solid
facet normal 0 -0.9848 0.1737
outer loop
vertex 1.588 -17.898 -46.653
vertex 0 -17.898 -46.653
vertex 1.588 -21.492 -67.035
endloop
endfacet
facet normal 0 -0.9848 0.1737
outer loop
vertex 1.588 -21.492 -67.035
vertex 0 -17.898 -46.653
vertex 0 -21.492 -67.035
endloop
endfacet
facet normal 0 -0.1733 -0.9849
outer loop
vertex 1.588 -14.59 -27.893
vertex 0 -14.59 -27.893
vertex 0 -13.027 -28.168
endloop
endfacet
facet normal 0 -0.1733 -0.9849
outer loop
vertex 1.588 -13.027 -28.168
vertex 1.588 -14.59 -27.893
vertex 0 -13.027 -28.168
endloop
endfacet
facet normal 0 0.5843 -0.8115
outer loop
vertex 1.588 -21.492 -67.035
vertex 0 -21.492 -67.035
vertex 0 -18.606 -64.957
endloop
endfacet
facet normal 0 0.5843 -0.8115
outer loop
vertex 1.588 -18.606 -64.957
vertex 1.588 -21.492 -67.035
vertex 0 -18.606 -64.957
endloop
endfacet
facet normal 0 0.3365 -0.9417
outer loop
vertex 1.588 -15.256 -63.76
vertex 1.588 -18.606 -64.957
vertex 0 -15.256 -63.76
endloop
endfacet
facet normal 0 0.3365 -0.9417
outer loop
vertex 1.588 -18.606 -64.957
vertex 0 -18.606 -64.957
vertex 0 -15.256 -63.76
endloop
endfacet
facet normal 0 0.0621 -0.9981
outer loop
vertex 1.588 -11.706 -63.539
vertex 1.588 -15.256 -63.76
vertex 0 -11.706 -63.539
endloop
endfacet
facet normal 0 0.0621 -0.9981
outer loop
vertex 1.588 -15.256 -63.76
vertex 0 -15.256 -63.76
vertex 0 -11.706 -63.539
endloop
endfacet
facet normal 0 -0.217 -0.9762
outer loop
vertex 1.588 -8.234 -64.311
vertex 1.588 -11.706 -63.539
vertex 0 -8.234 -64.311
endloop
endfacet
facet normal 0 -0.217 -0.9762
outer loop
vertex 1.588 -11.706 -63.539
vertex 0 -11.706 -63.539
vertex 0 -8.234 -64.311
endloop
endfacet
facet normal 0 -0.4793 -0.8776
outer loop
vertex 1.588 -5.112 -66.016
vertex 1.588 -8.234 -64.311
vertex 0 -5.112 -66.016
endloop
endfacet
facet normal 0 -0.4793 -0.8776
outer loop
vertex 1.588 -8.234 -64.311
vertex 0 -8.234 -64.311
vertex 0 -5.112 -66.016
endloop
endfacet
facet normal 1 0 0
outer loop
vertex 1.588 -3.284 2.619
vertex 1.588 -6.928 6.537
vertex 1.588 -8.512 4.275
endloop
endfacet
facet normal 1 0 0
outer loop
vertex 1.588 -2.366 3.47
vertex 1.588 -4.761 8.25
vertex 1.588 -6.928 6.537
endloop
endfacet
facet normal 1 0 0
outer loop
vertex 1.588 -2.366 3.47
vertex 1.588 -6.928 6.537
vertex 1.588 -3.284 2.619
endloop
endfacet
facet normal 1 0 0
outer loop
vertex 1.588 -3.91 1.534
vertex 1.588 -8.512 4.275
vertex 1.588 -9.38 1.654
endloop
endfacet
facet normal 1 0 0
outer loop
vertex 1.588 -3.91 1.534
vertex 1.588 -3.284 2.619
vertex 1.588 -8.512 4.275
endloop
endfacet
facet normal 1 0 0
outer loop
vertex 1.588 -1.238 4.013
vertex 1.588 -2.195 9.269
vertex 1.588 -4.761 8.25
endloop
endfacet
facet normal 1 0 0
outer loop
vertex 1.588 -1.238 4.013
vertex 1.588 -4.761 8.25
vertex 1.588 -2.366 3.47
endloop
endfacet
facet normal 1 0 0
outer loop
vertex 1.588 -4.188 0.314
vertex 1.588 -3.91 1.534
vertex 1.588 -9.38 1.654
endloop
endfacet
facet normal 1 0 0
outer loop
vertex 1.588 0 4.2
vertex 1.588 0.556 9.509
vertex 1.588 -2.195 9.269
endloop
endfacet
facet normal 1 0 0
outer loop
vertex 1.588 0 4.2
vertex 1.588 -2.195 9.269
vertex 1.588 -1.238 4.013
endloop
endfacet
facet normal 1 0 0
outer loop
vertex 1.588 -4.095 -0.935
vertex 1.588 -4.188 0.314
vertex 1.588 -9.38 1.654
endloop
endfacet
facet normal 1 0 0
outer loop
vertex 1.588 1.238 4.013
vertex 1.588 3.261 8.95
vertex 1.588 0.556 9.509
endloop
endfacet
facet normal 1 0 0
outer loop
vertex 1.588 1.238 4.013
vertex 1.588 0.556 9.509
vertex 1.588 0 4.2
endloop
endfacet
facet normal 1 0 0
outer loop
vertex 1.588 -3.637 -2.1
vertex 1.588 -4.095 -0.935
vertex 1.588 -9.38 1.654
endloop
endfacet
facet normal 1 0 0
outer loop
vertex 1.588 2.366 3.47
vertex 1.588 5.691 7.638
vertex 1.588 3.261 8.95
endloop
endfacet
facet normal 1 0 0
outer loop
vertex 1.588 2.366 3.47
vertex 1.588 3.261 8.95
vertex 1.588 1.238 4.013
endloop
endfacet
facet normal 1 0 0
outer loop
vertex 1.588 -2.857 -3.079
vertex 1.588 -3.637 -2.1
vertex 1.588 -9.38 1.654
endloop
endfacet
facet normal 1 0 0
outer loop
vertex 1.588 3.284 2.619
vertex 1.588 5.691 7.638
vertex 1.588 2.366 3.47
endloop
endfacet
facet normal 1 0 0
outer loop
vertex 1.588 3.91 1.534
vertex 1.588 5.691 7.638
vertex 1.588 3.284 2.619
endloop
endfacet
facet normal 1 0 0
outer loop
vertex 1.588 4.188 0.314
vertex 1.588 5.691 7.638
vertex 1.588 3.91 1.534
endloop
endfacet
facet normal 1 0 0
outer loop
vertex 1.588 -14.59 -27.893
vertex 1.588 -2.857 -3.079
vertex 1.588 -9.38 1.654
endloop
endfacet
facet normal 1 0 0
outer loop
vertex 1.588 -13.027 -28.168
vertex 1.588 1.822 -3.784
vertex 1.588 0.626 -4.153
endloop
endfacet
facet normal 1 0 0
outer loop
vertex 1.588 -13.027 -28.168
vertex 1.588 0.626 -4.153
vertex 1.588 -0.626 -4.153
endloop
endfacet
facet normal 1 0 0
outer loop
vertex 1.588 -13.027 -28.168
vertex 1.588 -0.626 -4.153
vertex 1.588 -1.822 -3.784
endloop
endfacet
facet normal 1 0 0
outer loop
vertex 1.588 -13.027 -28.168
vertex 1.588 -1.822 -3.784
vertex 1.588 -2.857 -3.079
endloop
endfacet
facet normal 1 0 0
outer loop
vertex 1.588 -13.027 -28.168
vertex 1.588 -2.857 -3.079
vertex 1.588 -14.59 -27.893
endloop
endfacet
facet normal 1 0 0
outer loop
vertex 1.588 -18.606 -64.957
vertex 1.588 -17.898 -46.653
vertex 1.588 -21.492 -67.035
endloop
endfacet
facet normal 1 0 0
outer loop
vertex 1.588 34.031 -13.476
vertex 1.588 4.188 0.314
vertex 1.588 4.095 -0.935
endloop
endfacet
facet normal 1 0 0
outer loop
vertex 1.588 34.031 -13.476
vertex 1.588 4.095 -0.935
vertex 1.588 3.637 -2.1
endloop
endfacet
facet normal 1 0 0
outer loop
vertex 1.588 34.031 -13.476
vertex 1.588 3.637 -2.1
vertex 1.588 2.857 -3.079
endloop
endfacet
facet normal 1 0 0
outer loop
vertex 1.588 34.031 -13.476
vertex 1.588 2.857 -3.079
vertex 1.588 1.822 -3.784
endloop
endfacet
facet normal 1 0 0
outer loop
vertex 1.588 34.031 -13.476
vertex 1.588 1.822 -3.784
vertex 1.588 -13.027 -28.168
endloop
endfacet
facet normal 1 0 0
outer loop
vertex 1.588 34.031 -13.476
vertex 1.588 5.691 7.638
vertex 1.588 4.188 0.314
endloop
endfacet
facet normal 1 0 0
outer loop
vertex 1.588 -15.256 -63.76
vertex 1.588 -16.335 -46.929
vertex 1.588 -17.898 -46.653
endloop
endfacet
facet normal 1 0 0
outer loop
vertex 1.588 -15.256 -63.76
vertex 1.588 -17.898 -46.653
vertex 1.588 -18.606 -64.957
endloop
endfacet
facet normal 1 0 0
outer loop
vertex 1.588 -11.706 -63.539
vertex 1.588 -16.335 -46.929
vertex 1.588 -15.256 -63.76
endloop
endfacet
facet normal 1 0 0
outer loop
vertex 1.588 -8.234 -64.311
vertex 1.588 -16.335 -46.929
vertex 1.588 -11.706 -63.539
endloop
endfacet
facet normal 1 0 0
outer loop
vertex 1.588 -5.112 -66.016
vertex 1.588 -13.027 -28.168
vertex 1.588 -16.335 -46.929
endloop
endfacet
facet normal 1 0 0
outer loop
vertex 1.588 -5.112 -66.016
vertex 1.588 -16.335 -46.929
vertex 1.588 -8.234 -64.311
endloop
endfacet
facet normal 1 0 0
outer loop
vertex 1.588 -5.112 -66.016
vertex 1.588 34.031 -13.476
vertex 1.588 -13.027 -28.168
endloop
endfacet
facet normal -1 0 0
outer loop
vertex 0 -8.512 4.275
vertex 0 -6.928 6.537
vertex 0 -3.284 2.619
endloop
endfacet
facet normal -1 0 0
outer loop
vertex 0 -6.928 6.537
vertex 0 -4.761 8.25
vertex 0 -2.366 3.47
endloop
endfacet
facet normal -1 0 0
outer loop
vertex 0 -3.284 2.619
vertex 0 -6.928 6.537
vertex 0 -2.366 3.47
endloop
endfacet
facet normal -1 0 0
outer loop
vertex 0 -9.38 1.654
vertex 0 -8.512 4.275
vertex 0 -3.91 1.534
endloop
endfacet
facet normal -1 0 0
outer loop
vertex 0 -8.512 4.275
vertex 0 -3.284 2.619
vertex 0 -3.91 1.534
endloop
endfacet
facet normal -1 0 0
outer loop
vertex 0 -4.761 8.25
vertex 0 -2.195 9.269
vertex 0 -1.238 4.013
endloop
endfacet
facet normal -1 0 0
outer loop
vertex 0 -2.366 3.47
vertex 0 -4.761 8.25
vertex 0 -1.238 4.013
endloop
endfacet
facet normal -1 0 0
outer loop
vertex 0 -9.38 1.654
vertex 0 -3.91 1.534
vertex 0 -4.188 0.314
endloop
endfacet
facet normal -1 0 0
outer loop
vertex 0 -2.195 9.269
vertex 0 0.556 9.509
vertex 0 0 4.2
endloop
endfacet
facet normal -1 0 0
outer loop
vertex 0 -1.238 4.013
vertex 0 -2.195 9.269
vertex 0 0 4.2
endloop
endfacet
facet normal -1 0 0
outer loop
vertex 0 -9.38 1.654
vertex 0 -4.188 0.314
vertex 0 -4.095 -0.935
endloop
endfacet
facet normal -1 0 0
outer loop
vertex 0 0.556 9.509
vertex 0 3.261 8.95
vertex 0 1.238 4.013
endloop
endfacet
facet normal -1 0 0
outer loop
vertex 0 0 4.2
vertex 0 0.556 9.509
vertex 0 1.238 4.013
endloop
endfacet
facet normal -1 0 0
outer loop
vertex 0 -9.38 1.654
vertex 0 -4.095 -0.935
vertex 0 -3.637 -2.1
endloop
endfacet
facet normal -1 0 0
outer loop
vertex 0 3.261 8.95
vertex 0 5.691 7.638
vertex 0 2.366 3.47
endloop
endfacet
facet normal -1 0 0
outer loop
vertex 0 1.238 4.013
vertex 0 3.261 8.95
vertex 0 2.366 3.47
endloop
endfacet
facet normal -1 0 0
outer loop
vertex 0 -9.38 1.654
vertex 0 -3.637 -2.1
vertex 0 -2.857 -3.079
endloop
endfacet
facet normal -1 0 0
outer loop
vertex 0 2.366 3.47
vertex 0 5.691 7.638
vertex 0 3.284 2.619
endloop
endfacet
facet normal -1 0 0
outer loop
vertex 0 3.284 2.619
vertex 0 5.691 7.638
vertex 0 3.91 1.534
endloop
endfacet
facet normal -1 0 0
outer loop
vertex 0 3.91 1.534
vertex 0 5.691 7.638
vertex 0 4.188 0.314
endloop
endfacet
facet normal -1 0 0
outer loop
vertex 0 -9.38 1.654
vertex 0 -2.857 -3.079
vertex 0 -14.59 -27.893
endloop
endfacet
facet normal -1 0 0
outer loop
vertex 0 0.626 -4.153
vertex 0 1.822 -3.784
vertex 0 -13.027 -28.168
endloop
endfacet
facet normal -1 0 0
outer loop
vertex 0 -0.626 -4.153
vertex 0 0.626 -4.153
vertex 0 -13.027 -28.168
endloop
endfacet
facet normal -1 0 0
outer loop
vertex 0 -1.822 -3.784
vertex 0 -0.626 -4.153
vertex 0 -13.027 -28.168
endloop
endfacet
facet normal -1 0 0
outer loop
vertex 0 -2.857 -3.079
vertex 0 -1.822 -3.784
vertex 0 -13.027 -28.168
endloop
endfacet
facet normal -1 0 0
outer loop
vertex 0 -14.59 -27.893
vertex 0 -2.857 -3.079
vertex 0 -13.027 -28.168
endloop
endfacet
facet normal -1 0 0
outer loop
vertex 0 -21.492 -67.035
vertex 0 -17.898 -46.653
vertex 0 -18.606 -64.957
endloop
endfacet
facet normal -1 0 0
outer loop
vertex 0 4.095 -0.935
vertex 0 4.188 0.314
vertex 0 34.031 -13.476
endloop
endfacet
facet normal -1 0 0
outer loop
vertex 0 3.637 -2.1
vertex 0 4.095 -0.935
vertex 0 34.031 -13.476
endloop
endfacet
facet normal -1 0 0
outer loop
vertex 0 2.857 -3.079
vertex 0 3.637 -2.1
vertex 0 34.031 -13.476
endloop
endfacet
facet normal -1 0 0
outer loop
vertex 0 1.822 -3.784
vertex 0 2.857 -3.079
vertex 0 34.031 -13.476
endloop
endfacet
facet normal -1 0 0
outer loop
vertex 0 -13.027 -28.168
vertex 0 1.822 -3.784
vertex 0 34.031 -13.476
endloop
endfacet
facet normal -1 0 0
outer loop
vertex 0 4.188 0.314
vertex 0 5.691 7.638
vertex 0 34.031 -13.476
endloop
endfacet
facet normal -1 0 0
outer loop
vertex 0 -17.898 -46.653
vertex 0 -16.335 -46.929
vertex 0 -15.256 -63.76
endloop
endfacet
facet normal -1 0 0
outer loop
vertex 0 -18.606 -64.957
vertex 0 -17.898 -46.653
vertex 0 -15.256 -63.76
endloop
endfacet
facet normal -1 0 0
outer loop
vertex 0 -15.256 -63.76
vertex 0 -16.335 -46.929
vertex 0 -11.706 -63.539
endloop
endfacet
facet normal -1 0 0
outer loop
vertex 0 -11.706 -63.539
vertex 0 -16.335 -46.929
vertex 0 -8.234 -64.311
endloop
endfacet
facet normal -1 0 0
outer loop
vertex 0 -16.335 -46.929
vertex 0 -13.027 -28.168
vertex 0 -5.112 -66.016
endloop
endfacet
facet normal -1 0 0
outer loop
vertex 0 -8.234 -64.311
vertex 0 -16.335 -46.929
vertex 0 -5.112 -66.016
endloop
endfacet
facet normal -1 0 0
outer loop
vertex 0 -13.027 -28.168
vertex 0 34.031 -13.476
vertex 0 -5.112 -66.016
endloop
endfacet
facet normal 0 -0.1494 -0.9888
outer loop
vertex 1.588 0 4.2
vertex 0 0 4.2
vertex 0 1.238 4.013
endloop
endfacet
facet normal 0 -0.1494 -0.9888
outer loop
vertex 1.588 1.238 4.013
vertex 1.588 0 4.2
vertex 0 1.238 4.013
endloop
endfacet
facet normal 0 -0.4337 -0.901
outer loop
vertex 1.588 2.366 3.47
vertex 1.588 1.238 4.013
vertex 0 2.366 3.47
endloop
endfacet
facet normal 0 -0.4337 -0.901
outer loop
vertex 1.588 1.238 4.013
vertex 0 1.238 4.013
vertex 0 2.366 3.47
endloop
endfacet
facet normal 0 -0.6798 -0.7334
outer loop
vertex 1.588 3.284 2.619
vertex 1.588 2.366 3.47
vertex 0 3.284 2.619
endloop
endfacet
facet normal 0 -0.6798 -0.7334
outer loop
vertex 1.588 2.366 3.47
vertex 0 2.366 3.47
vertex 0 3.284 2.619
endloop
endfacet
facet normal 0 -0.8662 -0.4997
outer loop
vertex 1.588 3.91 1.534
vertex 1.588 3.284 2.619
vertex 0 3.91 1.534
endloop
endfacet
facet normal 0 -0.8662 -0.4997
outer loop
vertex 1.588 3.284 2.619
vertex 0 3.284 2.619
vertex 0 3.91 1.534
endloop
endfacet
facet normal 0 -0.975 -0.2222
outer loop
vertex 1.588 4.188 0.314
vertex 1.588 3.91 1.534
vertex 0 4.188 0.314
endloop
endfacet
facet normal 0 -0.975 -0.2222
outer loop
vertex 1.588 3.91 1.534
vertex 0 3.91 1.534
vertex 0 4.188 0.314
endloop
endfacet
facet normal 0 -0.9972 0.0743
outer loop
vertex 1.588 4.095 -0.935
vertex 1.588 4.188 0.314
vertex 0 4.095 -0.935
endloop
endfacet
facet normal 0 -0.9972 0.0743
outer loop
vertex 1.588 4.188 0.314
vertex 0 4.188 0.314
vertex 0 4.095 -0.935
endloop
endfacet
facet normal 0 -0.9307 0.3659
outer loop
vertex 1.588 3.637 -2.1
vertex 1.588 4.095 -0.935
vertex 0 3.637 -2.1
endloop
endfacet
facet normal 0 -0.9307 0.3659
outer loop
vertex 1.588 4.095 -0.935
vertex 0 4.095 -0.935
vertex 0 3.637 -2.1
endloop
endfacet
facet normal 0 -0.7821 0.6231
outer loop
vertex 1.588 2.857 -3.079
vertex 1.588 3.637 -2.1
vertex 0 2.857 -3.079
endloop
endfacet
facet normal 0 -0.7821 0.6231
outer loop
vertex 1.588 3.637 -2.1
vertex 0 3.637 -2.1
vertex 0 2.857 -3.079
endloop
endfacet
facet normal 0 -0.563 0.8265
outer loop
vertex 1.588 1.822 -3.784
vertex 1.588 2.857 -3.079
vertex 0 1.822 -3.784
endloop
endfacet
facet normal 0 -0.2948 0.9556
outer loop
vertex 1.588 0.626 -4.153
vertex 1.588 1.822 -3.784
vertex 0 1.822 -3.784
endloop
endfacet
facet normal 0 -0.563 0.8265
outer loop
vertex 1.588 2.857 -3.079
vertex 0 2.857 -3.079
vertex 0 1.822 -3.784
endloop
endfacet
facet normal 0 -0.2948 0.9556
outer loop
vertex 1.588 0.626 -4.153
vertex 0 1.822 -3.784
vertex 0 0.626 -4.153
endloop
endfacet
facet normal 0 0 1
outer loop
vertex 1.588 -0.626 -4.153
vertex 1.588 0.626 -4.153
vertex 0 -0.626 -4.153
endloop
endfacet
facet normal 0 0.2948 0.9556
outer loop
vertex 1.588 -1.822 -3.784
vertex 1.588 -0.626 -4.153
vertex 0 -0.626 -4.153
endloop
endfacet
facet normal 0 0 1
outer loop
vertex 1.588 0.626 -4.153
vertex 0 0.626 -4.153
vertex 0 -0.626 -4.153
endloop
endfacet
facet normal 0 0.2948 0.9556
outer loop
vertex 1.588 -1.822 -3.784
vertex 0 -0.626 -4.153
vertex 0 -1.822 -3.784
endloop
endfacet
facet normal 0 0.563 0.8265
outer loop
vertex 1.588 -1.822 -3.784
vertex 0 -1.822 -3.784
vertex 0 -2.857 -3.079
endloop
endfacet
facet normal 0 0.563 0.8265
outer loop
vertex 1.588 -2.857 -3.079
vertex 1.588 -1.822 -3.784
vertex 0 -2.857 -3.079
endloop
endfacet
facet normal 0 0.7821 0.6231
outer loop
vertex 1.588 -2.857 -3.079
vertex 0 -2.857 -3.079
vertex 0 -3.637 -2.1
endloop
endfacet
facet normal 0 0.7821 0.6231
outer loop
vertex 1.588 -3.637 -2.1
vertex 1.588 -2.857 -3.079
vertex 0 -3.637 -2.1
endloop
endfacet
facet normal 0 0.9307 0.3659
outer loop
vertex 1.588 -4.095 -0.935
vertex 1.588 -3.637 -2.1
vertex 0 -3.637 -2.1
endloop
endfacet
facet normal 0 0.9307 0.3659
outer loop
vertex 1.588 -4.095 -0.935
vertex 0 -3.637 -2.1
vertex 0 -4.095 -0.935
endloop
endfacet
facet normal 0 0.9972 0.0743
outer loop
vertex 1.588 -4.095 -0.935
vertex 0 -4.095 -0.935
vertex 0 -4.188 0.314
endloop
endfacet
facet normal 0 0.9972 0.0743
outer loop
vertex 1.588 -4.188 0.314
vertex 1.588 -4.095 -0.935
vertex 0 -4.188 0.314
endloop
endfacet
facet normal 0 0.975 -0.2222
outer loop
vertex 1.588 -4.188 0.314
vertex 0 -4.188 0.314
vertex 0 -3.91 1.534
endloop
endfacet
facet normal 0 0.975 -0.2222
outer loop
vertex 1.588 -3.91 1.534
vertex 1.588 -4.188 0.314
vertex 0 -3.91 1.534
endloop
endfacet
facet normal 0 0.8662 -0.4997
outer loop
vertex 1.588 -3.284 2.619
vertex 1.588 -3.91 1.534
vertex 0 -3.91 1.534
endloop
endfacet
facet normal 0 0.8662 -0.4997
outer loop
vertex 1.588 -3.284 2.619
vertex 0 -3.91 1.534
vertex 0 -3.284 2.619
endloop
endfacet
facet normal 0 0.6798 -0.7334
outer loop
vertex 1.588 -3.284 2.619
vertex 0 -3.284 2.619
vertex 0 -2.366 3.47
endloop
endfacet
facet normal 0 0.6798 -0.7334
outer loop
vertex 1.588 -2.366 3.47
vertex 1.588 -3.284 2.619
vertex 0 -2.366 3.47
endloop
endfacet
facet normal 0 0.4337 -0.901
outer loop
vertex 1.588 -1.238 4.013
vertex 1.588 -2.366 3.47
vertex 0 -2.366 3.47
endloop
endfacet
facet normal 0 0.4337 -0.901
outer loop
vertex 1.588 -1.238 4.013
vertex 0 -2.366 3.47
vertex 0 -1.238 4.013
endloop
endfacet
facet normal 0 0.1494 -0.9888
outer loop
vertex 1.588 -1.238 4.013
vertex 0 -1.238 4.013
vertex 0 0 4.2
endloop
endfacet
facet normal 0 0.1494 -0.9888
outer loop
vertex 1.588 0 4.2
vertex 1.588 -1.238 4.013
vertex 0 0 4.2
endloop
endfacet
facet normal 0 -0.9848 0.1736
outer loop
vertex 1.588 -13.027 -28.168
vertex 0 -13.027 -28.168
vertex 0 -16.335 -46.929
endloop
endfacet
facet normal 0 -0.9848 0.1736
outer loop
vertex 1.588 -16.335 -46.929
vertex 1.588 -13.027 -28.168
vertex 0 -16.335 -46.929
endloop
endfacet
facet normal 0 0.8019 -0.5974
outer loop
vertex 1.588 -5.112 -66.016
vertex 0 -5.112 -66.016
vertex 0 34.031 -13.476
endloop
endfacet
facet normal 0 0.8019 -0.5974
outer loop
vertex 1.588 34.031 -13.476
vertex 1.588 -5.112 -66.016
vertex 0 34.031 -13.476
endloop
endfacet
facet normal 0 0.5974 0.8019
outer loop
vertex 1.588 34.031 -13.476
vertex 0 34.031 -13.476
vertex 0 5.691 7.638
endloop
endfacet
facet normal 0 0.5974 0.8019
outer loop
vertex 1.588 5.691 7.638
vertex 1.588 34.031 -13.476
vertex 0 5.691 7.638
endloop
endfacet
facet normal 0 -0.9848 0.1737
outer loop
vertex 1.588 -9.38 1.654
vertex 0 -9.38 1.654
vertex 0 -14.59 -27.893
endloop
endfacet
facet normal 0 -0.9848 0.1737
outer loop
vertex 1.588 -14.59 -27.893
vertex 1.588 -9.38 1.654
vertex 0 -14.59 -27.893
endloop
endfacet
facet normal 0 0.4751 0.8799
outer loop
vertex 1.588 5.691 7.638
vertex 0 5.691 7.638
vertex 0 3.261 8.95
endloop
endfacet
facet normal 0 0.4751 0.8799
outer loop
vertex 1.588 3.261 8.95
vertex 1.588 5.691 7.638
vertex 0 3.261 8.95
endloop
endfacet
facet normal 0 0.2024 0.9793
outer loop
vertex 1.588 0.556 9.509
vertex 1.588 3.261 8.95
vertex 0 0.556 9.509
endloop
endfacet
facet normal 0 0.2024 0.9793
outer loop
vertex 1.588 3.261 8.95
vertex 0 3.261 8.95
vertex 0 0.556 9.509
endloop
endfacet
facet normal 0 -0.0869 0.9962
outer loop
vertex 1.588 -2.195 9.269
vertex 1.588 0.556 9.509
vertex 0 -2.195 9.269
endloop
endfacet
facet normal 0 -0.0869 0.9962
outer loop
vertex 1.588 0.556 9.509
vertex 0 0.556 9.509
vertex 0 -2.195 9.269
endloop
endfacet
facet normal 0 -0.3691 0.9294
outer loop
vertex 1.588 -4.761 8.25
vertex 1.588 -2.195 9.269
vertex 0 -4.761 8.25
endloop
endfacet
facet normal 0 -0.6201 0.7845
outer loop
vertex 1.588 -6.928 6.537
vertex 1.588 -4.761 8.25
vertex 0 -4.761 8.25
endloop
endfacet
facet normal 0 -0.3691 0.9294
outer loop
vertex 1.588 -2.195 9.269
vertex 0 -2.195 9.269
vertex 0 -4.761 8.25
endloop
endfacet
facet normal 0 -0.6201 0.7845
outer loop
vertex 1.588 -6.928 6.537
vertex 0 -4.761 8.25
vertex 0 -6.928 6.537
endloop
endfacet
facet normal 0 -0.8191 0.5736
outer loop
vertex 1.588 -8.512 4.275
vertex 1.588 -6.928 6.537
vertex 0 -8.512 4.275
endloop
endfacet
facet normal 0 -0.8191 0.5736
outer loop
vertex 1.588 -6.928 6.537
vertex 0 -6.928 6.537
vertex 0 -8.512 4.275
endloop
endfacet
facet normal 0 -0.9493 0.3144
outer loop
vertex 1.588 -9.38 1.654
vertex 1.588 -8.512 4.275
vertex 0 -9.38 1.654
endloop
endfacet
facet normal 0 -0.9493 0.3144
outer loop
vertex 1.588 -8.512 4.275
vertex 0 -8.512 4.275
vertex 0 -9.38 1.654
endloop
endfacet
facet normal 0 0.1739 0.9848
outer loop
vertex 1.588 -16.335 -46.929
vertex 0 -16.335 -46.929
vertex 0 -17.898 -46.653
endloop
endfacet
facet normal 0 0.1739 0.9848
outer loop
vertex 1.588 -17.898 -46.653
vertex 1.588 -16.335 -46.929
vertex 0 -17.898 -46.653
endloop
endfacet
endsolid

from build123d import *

# Parameters (mm, degrees)
BOSS_EXTRUDE1_DEPTH  = 1.5875
M8_CLEARANCE_HOLE1_D = 8.4


with BuildPart() as part:
    # Sketch1 → Boss-Extrude1 (new body)
    with BuildSketch(Plane(origin=(0, 0, 0), x_dir=(0, 0, -1), z_dir=(1, 0, 0))):
        with BuildLine():
            ThreePointArc((-7.638168997, 5.690694103), (-8.852669963, -3.515090259), (-1.653998892, -9.380293847))
            Line((-1.653998892, -9.380293847), (27.892706706, -14.590175236))
            Line((27.892706706, -14.590175236), (28.168373188, -13.026792928))
            Line((28.168373188, -13.026792928), (46.928960883, -16.334790712))
            Line((46.928960883, -16.334790712), (46.653294401, -17.89817302))
            Line((46.653294401, -17.89817302), (67.035446451, -21.492096351))
            ThreePointArc((67.035446451, -21.492096351), (63.524537099, -13.489075558), (66.01577467, -5.112407863))
            Line((66.01577467, -5.112407863), (13.47644349, 34.0311699))
            Line((13.47644349, 34.0311699), (-7.638168997, 5.690694103))
        make_face()
    extrude(amount=BOSS_EXTRUDE1_DEPTH)

    # M8 Clearance Hole1 (through all)
    with Locations(Plane(origin=(1.5875, 0, 0), x_dir=(0, 0, -1), z_dir=(1, 0, 0))):
        with Locations((0, 0)):
            Hole(M8_CLEARANCE_HOLE1_D / 2)


solid = part.part
